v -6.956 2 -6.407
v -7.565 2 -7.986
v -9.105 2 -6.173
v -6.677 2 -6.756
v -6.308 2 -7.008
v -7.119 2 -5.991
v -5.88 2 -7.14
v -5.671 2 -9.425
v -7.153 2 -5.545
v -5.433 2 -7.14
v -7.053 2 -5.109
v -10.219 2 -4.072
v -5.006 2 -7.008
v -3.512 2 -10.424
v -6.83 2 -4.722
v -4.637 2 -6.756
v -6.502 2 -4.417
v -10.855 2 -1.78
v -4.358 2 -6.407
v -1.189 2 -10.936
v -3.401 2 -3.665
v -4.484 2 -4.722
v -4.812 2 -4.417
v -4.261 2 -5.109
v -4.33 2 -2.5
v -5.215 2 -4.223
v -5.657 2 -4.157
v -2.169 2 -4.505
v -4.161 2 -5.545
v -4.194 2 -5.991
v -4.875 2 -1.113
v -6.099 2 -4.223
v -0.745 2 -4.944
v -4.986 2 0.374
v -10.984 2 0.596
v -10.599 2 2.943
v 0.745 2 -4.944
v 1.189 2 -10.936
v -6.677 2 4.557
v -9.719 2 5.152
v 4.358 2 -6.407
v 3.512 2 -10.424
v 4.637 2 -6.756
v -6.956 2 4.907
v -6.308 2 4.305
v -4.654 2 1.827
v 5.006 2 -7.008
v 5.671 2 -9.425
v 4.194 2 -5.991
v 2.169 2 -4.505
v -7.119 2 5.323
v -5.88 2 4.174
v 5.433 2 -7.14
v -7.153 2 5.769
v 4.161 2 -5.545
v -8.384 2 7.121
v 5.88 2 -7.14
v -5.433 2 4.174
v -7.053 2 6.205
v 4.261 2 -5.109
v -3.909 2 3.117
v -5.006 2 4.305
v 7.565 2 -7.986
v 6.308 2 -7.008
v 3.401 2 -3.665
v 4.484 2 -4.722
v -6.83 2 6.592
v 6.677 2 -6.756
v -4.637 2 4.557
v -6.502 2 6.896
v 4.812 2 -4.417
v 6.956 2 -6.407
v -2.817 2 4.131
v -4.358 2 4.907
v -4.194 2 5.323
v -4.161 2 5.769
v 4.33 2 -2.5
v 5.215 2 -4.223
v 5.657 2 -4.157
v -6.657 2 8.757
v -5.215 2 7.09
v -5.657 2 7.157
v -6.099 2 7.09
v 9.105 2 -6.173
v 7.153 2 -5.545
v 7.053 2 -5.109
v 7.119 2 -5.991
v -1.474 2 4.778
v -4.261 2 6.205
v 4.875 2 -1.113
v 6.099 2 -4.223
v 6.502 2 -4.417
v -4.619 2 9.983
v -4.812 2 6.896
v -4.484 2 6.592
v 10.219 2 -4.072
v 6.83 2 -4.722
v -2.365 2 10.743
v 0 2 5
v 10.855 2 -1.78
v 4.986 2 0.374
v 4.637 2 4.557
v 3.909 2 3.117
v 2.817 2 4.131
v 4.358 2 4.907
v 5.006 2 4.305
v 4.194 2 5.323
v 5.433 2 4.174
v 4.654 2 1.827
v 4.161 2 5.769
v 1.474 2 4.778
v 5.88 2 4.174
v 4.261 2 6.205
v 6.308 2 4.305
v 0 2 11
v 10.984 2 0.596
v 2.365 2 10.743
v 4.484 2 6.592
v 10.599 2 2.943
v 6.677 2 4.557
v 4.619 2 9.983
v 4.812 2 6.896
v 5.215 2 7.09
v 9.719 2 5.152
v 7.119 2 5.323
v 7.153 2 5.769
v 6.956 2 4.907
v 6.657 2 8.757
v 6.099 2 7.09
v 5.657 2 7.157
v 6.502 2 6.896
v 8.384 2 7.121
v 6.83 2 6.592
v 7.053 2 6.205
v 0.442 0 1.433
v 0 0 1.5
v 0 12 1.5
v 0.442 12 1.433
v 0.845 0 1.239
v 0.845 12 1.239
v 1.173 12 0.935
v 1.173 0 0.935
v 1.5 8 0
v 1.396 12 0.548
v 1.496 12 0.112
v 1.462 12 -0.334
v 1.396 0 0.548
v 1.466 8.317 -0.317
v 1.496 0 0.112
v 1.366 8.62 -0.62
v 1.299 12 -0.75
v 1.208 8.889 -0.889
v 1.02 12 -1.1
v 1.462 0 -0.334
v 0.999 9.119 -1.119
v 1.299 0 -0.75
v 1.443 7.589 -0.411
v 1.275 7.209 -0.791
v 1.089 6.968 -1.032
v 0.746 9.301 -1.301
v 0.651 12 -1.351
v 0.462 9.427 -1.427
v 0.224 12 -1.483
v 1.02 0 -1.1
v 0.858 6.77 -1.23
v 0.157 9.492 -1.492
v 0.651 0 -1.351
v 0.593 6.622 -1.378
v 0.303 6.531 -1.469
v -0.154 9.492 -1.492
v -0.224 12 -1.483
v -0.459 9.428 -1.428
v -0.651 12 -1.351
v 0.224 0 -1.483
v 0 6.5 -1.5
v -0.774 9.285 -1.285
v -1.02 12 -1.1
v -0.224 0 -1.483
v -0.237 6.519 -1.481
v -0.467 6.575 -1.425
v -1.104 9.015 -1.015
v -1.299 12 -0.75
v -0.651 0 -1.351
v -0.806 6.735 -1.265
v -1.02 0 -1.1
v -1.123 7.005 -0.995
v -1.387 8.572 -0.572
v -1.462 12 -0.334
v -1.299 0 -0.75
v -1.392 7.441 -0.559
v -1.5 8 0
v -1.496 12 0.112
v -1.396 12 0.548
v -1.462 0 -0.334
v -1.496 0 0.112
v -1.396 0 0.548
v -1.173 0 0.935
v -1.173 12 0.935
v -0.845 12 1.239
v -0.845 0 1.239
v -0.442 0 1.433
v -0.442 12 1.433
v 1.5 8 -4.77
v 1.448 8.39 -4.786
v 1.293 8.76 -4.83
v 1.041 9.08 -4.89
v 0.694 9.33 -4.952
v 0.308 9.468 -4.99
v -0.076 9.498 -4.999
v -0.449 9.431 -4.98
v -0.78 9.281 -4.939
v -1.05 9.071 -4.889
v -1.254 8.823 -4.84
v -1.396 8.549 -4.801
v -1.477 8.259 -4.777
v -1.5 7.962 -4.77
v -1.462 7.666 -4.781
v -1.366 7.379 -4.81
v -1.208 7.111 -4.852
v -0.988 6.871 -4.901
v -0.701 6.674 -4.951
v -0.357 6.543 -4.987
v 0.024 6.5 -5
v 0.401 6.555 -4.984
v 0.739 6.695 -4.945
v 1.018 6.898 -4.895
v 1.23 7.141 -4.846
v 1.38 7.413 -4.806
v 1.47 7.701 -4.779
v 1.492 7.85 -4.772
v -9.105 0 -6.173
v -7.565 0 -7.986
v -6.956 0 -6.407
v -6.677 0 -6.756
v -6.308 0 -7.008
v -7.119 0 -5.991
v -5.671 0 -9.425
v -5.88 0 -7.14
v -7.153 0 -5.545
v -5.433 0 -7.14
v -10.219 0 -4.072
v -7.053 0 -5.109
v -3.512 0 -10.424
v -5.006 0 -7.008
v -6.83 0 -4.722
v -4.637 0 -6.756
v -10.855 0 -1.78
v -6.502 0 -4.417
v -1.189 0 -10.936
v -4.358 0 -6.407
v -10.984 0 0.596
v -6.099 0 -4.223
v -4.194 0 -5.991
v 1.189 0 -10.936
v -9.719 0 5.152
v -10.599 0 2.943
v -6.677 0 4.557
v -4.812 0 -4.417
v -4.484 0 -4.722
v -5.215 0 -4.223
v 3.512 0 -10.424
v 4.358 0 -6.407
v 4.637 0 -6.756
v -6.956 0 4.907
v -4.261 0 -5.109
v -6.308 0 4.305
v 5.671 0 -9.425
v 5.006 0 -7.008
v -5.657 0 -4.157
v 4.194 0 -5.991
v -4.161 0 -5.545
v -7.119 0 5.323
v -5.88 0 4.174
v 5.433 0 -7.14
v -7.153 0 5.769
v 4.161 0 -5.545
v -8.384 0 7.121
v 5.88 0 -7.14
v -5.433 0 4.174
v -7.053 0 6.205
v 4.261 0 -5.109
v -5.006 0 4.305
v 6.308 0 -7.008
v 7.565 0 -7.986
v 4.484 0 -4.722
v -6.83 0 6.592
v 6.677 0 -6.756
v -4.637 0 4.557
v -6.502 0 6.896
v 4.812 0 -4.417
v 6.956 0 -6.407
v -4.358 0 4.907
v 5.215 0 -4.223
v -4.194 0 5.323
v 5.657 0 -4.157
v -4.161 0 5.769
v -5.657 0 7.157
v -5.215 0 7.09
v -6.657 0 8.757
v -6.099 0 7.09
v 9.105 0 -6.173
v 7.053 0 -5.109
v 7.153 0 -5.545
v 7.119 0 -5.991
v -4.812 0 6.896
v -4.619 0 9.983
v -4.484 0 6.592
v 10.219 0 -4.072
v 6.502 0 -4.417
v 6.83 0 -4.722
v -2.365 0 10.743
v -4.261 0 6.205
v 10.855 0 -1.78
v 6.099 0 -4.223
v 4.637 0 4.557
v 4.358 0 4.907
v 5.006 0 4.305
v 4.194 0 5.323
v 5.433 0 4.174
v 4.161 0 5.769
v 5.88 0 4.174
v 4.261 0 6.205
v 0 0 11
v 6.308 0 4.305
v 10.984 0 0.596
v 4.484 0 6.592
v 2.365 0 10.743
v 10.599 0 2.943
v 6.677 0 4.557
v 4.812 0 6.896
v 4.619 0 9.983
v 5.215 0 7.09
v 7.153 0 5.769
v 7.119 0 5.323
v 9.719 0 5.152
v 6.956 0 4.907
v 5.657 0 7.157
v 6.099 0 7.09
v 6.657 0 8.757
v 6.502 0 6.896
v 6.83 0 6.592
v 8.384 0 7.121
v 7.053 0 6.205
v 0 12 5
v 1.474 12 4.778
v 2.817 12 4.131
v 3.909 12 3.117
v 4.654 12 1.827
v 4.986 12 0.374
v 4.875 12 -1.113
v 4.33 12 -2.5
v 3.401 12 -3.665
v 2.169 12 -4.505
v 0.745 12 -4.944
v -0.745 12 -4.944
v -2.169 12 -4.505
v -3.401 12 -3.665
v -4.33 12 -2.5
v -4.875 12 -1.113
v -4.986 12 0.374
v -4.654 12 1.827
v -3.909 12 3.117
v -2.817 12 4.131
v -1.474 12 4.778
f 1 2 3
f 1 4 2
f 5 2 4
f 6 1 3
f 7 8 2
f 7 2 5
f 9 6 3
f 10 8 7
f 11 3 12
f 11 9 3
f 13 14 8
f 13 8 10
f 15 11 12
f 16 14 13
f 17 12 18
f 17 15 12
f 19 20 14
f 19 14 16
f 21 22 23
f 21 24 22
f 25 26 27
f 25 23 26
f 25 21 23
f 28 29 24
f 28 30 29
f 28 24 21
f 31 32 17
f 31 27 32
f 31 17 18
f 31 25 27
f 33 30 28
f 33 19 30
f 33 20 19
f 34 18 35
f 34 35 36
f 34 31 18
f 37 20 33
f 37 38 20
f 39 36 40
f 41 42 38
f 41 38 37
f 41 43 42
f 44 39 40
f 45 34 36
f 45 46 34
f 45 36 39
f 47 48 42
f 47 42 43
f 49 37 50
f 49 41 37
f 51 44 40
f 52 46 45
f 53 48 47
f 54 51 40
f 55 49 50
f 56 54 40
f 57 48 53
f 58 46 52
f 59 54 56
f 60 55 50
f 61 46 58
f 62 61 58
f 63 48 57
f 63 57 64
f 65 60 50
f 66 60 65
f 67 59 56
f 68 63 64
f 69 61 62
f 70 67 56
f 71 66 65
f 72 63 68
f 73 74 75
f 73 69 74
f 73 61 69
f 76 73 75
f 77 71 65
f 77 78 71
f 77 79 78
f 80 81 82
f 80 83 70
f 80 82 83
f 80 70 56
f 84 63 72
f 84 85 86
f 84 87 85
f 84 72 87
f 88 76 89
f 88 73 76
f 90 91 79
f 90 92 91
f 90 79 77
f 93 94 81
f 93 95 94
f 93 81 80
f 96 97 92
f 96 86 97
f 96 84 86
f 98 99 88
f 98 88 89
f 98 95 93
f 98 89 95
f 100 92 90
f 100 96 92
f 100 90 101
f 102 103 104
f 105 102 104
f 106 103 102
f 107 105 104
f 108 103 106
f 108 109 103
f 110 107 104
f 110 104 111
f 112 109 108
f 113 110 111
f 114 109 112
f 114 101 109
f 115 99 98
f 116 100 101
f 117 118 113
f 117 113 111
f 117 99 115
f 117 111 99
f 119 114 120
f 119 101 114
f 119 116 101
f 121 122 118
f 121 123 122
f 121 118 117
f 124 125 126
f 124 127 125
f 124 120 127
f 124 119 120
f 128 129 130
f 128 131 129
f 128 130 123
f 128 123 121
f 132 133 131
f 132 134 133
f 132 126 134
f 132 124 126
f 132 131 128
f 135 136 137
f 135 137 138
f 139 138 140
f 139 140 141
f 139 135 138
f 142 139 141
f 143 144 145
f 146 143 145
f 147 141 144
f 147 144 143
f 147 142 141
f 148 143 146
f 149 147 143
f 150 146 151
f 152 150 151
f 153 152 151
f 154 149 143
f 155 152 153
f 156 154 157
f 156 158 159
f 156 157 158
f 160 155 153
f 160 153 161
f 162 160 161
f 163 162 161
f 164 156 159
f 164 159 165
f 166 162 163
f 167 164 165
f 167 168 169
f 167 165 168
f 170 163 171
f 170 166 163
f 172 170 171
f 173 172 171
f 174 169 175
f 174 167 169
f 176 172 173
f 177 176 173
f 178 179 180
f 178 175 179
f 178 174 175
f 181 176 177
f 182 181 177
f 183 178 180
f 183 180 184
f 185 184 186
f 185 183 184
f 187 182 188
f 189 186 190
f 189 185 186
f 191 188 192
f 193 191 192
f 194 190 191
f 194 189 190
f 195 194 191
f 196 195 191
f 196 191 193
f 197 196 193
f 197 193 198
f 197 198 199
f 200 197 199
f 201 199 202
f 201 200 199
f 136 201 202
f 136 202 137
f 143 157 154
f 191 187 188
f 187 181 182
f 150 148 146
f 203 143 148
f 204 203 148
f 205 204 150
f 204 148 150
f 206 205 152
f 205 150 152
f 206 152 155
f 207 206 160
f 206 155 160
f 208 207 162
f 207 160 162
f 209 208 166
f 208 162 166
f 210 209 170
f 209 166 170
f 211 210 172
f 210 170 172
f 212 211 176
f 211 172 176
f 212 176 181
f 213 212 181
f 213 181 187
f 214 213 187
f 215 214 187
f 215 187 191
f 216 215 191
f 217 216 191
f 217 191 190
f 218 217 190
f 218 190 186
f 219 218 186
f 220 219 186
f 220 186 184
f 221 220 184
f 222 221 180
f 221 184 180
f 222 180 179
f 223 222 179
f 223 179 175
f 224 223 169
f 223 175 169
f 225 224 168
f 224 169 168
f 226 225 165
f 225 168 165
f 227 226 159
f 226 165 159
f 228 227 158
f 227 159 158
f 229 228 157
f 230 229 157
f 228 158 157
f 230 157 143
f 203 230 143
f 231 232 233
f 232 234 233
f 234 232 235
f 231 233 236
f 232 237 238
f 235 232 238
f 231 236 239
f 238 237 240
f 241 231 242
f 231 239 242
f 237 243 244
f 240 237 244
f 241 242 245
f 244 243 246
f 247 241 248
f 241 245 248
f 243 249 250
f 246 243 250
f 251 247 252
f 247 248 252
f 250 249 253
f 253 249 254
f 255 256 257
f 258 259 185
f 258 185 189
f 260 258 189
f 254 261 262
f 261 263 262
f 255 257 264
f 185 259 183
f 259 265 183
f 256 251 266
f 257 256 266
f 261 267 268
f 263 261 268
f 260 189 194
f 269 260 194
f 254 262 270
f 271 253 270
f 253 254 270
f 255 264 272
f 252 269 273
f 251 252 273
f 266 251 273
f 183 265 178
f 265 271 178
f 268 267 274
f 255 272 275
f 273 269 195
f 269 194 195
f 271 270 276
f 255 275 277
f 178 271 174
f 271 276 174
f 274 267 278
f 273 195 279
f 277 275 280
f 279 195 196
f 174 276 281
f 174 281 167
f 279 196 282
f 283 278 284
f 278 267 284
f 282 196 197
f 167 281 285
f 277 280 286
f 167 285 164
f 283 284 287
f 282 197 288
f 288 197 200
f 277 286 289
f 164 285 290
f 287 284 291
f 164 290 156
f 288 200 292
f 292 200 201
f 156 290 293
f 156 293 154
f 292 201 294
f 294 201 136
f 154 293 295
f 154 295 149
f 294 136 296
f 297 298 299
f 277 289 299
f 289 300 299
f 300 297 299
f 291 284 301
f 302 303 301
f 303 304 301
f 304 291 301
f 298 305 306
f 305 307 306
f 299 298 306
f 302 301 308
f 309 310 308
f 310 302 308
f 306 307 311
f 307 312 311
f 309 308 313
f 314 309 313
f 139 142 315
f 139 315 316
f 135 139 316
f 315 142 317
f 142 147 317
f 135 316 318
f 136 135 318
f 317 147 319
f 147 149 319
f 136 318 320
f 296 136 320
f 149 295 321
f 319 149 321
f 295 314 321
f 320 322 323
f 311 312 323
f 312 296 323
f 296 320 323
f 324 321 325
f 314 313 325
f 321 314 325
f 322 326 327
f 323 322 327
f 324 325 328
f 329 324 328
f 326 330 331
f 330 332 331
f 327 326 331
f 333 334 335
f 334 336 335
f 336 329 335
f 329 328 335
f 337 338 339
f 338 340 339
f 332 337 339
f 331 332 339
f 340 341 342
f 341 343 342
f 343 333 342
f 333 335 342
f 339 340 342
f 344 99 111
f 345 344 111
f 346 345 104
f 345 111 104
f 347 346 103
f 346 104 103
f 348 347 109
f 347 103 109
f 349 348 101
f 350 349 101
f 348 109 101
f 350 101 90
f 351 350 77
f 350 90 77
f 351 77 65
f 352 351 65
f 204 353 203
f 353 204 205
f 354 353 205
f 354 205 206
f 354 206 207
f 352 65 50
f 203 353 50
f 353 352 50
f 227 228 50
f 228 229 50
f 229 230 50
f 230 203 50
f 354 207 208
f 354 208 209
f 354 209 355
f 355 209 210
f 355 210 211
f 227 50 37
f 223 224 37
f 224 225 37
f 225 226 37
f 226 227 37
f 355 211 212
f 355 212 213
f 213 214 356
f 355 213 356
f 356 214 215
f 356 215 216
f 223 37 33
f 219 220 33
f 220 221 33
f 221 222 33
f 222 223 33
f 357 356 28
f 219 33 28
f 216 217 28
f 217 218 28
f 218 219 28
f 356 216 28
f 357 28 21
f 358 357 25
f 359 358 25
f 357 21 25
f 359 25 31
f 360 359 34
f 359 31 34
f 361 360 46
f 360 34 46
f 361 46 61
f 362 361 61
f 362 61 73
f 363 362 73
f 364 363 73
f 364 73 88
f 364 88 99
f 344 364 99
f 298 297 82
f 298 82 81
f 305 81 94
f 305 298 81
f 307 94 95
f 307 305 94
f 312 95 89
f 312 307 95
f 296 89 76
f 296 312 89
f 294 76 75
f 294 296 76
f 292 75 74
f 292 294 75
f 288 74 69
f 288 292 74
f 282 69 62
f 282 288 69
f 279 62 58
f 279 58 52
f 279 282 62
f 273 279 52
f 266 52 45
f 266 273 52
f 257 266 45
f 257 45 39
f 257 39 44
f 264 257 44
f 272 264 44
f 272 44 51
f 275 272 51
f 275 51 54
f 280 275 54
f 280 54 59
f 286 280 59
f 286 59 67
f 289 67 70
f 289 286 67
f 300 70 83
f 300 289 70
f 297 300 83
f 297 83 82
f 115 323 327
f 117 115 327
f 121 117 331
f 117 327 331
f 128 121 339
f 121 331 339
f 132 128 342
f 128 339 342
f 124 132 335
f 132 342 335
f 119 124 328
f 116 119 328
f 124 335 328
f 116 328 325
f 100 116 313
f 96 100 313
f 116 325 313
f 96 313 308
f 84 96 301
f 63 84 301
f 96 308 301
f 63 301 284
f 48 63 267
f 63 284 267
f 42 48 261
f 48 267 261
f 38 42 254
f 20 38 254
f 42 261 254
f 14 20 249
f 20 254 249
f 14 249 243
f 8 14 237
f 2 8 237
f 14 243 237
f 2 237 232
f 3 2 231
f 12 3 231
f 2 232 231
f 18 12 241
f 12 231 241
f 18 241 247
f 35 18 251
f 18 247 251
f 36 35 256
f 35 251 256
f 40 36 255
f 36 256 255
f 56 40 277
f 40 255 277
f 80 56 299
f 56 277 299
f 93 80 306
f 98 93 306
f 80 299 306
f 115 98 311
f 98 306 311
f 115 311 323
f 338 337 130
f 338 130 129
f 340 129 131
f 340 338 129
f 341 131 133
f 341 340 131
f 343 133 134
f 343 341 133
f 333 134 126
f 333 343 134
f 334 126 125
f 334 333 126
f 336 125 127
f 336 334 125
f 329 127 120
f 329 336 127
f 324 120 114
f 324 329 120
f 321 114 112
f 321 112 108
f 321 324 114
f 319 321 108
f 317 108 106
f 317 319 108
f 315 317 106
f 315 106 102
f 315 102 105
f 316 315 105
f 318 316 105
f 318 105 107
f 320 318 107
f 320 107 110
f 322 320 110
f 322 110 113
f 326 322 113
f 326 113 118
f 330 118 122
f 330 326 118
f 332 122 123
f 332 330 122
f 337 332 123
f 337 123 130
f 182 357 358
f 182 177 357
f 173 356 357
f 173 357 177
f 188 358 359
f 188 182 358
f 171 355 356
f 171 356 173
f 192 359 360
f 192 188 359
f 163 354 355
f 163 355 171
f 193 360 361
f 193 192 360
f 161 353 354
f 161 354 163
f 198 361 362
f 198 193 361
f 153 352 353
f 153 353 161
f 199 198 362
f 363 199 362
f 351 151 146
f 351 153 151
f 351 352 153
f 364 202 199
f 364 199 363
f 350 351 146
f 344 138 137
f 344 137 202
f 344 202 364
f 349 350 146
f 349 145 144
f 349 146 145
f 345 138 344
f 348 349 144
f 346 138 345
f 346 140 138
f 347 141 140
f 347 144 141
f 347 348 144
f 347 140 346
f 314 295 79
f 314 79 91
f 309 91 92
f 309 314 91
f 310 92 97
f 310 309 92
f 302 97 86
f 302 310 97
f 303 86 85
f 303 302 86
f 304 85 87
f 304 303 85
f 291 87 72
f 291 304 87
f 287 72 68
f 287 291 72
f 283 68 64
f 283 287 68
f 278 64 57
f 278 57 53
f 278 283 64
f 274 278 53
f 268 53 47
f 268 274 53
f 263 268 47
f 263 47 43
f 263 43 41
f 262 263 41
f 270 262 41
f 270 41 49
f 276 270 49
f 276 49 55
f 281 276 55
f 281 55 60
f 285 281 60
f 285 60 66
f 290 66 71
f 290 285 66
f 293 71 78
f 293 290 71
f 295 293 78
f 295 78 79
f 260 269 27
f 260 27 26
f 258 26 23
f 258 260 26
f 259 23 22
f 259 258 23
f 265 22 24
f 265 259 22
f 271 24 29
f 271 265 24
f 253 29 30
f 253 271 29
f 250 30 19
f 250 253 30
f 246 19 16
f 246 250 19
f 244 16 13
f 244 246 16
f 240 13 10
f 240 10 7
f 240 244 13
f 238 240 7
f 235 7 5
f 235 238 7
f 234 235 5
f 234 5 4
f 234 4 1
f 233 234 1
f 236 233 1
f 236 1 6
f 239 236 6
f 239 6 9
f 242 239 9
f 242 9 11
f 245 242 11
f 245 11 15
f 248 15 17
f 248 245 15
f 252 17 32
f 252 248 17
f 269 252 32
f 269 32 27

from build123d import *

# Parameters (mm, degrees)
SKETCH_1_R          = 11
SKETCH_1_R_2        = 1.5
EXTRUDE_1_DEPTH     = 2
SKETCH_2_R          = 5
SKETCH_2_R_2        = 1.5
EXTRUDE_2_DEPTH     = 10
SKETCH_3_R          = 1.5
CUT_EXTRUDE_1_DEPTH = 8


with BuildPart() as part:
    # 草图1 → 凸台-拉伸1 (new body)
    with BuildSketch(Plane(origin=(0, 0, 0), x_dir=(1, 0, 0), z_dir=(0, 1, 0))):
        with Locations(Location((0, 0, 0), (0, 0, 270))):
            Circle(SKETCH_1_R)
        with Locations(Location((0, 0, 0), (0, 0, 270))):
            Circle(SKETCH_1_R_2, mode=Mode.SUBTRACT)
        with Locations(Location((5.656854249, 5.656854249, 0), (0, 0, 270))):
            Circle(SKETCH_1_R_2, mode=Mode.SUBTRACT)
        with Locations(Location((-5.656854249, 5.656854249, 0), (0, 0, 270))):
            Circle(SKETCH_1_R_2, mode=Mode.SUBTRACT)
        with Locations(Location((-5.656854249, -5.656854249, 0), (0, 0, 270))):
            Circle(SKETCH_1_R_2, mode=Mode.SUBTRACT)
        with Locations(Location((5.656854249, -5.656854249, 0), (0, 0, 270))):
            Circle(SKETCH_1_R_2, mode=Mode.SUBTRACT)
    extrude(amount=EXTRUDE_1_DEPTH)

    # 草图2 → 凸台-拉伸2 (add)
    with BuildSketch(Plane(origin=(0, 2, 0), x_dir=(1, 0, 0), z_dir=(0, 1, 0))):
        with Locations(Location((0, 0, 0), (0, 0, 270))):
            Circle(SKETCH_2_R)
        with Locations(Location((0, 0, 0), (0, 0, 270))):
            Circle(SKETCH_2_R_2, mode=Mode.SUBTRACT)
    extrude(amount=EXTRUDE_2_DEPTH)

    # 草图3 → 切除-拉伸1 (cut)
    with BuildSketch(Plane.XY):
        with Locations((0, 8)):
            Circle(SKETCH_3_R)
    extrude(amount=-CUT_EXTRUDE_1_DEPTH, mode=Mode.SUBTRACT)


solid = part.part
